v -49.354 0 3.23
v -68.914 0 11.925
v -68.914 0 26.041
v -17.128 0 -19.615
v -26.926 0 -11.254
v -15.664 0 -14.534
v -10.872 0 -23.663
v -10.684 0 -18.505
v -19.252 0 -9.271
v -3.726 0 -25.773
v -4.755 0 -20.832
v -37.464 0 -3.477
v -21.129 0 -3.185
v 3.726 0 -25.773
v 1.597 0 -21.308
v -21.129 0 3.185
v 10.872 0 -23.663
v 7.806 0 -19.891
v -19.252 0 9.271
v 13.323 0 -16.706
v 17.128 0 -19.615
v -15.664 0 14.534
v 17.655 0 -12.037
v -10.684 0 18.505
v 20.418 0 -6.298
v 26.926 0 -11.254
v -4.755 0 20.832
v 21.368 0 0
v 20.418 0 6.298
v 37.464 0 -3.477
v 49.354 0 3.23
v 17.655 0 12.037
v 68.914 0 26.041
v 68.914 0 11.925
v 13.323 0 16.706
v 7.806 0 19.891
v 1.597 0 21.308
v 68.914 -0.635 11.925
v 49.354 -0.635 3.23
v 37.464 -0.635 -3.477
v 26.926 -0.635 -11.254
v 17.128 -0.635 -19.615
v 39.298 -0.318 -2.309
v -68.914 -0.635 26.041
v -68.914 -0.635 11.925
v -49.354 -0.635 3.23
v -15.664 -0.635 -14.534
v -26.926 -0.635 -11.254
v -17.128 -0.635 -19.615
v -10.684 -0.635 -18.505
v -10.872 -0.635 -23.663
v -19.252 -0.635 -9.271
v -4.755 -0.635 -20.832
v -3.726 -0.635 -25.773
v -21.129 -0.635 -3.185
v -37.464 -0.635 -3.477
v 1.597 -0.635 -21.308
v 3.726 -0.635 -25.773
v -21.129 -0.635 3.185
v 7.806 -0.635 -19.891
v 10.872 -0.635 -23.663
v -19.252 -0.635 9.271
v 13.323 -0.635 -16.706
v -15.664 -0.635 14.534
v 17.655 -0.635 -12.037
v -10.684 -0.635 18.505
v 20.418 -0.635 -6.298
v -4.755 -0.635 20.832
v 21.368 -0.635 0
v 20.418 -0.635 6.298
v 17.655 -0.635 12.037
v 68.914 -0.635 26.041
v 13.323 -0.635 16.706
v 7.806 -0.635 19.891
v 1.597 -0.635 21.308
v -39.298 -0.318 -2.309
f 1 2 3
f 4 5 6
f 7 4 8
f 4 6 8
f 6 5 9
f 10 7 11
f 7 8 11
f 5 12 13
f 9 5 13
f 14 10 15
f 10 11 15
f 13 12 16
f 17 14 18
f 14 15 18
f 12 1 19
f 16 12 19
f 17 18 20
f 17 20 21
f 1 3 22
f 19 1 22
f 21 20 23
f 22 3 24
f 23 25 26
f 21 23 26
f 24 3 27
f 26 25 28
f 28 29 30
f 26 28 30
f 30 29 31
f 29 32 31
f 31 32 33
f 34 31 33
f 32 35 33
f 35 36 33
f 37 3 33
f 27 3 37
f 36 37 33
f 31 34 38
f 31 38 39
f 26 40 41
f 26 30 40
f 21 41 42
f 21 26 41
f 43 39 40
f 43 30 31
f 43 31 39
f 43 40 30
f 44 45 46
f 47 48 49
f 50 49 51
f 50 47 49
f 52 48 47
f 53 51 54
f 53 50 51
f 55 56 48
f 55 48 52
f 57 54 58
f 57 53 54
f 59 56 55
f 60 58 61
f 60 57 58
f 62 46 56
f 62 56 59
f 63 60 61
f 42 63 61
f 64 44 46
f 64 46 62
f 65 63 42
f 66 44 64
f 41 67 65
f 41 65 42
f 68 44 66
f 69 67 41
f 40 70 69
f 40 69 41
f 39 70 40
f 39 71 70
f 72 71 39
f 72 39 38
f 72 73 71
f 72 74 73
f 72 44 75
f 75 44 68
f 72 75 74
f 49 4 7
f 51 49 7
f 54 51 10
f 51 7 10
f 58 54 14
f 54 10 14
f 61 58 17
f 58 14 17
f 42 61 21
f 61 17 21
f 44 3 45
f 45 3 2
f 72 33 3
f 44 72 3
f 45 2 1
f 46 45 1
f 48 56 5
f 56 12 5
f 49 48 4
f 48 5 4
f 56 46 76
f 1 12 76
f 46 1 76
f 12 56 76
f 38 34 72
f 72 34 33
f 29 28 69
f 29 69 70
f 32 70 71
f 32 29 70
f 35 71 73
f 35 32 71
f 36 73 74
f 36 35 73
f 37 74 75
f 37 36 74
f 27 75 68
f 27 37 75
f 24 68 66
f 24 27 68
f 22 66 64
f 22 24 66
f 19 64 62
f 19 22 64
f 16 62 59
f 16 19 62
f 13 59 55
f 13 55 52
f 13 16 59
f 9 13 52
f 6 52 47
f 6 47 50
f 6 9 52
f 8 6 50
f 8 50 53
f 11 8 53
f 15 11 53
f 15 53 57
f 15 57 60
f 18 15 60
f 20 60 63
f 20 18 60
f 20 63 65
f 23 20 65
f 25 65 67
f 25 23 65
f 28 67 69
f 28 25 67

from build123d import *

# Parameters (mm, degrees)
F0_R     = 21.3676548909
F1_DEPTH = 0.635


with BuildPart() as f1:
    # F0 (on Front) → F1 (new body)
    with BuildSketch(Plane.XZ):
        with BuildLine():
            Line((68.9142415212, 26.0405766578), (0, 26.0405766578))
            Line((0, 26.0405766578), (-68.9142415212, 26.0405766578))
            Line((-68.9142415212, 26.0405766578), (-68.9142415212, 11.925470218))
            add(Edge.make_bspline(
                [(-68.9142415212, 11.925470218), (-58.5539967516, 7.5661347342), (-38.6011677749, -0.8164003994), (-24.1054599416, -13.5221086271), (-17.1279080613, -19.6149534313)],
                knots=[0, 0, 0, 0, 0.5194376377, 1, 1, 1, 1], degree=3))
            ThreePointArc((-17.1279080613, -19.6149534313), (0, -26.0405766578), (17.1279080613, -19.6149534313))
            add(Edge.make_bspline(
                [(68.9142415212, 11.925470218), (58.5539967516, 7.5661347342), (38.6011677749, -0.8164003994), (24.1054599416, -13.5221086271), (17.1279080613, -19.6149534313)],
                knots=[0, 0, 0, 0, 0.5194376377, 1, 1, 1, 1], degree=3))
            Line((68.9142415212, 11.925470218), (68.9142415212, 26.0405766578))
        make_face()
        Circle(F0_R, mode=Mode.SUBTRACT)
    extrude(amount=F1_DEPTH)


solid = f1.part
